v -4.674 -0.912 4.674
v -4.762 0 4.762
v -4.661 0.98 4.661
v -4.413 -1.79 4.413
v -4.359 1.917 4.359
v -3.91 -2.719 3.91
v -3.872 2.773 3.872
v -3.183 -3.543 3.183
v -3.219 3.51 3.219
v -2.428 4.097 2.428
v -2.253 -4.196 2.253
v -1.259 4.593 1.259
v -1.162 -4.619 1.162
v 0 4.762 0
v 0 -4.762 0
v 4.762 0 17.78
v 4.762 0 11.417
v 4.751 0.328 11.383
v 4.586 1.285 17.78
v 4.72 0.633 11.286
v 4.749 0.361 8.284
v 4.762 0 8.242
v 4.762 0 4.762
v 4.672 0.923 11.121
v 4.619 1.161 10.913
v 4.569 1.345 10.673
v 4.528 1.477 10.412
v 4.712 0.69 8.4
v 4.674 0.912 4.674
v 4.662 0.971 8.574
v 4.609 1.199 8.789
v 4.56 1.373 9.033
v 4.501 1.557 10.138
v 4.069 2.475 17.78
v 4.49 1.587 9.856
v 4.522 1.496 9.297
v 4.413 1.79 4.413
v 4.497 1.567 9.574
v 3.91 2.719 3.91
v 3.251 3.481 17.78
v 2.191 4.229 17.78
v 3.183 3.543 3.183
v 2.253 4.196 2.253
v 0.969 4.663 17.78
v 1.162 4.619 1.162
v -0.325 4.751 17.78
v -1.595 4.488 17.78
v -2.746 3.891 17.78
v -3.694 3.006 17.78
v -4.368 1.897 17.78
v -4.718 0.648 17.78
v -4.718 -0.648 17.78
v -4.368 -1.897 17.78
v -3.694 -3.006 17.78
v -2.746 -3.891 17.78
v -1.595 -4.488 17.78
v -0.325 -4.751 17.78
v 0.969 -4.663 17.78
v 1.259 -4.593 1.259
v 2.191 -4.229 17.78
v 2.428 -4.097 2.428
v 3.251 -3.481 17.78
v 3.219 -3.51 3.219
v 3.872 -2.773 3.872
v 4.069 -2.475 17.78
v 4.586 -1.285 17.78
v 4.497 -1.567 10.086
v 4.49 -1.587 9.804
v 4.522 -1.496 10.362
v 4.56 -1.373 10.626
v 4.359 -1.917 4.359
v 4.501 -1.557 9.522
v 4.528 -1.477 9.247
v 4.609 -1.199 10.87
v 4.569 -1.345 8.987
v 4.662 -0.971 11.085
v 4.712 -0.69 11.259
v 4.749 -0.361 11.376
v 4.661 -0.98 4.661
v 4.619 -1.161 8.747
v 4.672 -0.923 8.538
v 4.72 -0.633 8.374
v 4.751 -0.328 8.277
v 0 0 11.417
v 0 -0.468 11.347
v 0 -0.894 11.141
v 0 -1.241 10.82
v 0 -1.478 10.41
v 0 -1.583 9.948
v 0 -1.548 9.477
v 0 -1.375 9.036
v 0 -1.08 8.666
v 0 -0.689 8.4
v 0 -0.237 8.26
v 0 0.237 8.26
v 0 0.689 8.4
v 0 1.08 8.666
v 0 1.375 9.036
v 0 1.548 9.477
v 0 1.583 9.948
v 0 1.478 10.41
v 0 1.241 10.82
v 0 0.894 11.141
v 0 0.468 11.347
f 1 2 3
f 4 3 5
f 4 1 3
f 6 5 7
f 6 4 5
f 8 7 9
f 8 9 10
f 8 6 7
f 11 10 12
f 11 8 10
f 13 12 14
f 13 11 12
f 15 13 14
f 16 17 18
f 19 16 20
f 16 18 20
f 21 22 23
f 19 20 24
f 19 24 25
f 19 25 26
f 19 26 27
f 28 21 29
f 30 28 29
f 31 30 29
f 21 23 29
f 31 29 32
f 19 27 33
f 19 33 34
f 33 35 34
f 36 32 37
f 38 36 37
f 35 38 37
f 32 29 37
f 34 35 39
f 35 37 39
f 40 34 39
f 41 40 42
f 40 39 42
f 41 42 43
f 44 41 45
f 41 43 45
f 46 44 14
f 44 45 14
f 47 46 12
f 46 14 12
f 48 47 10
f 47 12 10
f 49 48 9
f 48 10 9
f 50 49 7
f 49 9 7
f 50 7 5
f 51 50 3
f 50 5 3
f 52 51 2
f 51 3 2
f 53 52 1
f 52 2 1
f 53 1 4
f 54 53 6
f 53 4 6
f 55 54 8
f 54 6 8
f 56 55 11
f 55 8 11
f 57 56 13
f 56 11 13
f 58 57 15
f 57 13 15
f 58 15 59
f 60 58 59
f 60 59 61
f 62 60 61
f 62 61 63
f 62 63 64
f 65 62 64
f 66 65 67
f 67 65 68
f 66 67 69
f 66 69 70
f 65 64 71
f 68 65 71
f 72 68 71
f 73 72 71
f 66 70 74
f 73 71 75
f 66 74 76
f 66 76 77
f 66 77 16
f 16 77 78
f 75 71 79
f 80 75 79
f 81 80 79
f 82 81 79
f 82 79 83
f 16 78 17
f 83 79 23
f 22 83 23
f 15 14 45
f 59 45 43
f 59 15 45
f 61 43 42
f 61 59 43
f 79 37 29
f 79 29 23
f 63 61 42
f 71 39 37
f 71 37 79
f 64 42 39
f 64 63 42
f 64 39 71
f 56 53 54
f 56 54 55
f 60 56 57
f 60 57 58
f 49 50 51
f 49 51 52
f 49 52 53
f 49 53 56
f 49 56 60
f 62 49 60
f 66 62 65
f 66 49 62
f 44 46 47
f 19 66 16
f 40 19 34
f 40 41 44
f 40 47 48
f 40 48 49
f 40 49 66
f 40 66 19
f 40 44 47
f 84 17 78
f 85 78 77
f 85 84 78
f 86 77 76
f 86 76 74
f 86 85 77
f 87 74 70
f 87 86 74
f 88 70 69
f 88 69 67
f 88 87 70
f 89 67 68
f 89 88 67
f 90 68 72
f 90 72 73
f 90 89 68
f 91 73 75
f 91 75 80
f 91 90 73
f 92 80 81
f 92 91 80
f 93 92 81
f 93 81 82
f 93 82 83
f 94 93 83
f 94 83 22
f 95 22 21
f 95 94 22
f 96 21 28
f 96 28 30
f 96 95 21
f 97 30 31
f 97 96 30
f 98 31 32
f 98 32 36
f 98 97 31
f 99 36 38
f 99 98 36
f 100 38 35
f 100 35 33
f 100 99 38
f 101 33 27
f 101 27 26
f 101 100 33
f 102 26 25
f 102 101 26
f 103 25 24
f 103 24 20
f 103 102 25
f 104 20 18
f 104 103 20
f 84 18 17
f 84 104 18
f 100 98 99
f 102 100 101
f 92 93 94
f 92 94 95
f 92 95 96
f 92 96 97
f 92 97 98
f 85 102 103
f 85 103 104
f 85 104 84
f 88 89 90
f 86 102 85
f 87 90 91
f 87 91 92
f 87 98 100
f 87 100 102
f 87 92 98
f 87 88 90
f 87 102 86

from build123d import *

# Parameters (mm, degrees)
SKETCH1_R           = 4.7625
EXTRUDE1_DEPTH      = 17.78
EXTRUDE2_DEPTH      = 20.01292225
EXTRUDE2_DEPTH_BACK = 20.01292225


with BuildPart() as part:
    # Sketch1 → Extrude1 (new body)
    with BuildSketch(Plane.XY):
        Circle(SKETCH1_R)
    extrude(amount=EXTRUDE1_DEPTH)

    # Sketch2 → Extrude2 (cut, two sides: drawn at the far end of the back side and taken through both)
    with BuildSketch(Plane(origin=(0, 0, 0), x_dir=(1, 0, 0), z_dir=(0, 1, 0)).offset(-EXTRUDE2_DEPTH_BACK)):
        Polygon((0, 0), (4.7625, -4.7625), (4.7625, 1.90519665), (-4.7625, 1.90519665), (-4.7625, -4.7625), align=None)
    extrude(amount=EXTRUDE2_DEPTH + EXTRUDE2_DEPTH_BACK, mode=Mode.SUBTRACT)

    # Sketch5 → 1/8 (0.125) Diameter Hole1 (revolve, cut)
    with BuildSketch(Plane(origin=(0, 0, 9.8298), x_dir=(0, 0, 1), z_dir=(0, 1, 0))):
        Polygon((0, 0), (0, 16.955866233), (1.5875, 16.002), (1.5875, 0), align=None)
    revolve(axis=Axis((-6.35, 0, 9.8298), (1, 0, 0)), mode=Mode.SUBTRACT)


solid = part.part
